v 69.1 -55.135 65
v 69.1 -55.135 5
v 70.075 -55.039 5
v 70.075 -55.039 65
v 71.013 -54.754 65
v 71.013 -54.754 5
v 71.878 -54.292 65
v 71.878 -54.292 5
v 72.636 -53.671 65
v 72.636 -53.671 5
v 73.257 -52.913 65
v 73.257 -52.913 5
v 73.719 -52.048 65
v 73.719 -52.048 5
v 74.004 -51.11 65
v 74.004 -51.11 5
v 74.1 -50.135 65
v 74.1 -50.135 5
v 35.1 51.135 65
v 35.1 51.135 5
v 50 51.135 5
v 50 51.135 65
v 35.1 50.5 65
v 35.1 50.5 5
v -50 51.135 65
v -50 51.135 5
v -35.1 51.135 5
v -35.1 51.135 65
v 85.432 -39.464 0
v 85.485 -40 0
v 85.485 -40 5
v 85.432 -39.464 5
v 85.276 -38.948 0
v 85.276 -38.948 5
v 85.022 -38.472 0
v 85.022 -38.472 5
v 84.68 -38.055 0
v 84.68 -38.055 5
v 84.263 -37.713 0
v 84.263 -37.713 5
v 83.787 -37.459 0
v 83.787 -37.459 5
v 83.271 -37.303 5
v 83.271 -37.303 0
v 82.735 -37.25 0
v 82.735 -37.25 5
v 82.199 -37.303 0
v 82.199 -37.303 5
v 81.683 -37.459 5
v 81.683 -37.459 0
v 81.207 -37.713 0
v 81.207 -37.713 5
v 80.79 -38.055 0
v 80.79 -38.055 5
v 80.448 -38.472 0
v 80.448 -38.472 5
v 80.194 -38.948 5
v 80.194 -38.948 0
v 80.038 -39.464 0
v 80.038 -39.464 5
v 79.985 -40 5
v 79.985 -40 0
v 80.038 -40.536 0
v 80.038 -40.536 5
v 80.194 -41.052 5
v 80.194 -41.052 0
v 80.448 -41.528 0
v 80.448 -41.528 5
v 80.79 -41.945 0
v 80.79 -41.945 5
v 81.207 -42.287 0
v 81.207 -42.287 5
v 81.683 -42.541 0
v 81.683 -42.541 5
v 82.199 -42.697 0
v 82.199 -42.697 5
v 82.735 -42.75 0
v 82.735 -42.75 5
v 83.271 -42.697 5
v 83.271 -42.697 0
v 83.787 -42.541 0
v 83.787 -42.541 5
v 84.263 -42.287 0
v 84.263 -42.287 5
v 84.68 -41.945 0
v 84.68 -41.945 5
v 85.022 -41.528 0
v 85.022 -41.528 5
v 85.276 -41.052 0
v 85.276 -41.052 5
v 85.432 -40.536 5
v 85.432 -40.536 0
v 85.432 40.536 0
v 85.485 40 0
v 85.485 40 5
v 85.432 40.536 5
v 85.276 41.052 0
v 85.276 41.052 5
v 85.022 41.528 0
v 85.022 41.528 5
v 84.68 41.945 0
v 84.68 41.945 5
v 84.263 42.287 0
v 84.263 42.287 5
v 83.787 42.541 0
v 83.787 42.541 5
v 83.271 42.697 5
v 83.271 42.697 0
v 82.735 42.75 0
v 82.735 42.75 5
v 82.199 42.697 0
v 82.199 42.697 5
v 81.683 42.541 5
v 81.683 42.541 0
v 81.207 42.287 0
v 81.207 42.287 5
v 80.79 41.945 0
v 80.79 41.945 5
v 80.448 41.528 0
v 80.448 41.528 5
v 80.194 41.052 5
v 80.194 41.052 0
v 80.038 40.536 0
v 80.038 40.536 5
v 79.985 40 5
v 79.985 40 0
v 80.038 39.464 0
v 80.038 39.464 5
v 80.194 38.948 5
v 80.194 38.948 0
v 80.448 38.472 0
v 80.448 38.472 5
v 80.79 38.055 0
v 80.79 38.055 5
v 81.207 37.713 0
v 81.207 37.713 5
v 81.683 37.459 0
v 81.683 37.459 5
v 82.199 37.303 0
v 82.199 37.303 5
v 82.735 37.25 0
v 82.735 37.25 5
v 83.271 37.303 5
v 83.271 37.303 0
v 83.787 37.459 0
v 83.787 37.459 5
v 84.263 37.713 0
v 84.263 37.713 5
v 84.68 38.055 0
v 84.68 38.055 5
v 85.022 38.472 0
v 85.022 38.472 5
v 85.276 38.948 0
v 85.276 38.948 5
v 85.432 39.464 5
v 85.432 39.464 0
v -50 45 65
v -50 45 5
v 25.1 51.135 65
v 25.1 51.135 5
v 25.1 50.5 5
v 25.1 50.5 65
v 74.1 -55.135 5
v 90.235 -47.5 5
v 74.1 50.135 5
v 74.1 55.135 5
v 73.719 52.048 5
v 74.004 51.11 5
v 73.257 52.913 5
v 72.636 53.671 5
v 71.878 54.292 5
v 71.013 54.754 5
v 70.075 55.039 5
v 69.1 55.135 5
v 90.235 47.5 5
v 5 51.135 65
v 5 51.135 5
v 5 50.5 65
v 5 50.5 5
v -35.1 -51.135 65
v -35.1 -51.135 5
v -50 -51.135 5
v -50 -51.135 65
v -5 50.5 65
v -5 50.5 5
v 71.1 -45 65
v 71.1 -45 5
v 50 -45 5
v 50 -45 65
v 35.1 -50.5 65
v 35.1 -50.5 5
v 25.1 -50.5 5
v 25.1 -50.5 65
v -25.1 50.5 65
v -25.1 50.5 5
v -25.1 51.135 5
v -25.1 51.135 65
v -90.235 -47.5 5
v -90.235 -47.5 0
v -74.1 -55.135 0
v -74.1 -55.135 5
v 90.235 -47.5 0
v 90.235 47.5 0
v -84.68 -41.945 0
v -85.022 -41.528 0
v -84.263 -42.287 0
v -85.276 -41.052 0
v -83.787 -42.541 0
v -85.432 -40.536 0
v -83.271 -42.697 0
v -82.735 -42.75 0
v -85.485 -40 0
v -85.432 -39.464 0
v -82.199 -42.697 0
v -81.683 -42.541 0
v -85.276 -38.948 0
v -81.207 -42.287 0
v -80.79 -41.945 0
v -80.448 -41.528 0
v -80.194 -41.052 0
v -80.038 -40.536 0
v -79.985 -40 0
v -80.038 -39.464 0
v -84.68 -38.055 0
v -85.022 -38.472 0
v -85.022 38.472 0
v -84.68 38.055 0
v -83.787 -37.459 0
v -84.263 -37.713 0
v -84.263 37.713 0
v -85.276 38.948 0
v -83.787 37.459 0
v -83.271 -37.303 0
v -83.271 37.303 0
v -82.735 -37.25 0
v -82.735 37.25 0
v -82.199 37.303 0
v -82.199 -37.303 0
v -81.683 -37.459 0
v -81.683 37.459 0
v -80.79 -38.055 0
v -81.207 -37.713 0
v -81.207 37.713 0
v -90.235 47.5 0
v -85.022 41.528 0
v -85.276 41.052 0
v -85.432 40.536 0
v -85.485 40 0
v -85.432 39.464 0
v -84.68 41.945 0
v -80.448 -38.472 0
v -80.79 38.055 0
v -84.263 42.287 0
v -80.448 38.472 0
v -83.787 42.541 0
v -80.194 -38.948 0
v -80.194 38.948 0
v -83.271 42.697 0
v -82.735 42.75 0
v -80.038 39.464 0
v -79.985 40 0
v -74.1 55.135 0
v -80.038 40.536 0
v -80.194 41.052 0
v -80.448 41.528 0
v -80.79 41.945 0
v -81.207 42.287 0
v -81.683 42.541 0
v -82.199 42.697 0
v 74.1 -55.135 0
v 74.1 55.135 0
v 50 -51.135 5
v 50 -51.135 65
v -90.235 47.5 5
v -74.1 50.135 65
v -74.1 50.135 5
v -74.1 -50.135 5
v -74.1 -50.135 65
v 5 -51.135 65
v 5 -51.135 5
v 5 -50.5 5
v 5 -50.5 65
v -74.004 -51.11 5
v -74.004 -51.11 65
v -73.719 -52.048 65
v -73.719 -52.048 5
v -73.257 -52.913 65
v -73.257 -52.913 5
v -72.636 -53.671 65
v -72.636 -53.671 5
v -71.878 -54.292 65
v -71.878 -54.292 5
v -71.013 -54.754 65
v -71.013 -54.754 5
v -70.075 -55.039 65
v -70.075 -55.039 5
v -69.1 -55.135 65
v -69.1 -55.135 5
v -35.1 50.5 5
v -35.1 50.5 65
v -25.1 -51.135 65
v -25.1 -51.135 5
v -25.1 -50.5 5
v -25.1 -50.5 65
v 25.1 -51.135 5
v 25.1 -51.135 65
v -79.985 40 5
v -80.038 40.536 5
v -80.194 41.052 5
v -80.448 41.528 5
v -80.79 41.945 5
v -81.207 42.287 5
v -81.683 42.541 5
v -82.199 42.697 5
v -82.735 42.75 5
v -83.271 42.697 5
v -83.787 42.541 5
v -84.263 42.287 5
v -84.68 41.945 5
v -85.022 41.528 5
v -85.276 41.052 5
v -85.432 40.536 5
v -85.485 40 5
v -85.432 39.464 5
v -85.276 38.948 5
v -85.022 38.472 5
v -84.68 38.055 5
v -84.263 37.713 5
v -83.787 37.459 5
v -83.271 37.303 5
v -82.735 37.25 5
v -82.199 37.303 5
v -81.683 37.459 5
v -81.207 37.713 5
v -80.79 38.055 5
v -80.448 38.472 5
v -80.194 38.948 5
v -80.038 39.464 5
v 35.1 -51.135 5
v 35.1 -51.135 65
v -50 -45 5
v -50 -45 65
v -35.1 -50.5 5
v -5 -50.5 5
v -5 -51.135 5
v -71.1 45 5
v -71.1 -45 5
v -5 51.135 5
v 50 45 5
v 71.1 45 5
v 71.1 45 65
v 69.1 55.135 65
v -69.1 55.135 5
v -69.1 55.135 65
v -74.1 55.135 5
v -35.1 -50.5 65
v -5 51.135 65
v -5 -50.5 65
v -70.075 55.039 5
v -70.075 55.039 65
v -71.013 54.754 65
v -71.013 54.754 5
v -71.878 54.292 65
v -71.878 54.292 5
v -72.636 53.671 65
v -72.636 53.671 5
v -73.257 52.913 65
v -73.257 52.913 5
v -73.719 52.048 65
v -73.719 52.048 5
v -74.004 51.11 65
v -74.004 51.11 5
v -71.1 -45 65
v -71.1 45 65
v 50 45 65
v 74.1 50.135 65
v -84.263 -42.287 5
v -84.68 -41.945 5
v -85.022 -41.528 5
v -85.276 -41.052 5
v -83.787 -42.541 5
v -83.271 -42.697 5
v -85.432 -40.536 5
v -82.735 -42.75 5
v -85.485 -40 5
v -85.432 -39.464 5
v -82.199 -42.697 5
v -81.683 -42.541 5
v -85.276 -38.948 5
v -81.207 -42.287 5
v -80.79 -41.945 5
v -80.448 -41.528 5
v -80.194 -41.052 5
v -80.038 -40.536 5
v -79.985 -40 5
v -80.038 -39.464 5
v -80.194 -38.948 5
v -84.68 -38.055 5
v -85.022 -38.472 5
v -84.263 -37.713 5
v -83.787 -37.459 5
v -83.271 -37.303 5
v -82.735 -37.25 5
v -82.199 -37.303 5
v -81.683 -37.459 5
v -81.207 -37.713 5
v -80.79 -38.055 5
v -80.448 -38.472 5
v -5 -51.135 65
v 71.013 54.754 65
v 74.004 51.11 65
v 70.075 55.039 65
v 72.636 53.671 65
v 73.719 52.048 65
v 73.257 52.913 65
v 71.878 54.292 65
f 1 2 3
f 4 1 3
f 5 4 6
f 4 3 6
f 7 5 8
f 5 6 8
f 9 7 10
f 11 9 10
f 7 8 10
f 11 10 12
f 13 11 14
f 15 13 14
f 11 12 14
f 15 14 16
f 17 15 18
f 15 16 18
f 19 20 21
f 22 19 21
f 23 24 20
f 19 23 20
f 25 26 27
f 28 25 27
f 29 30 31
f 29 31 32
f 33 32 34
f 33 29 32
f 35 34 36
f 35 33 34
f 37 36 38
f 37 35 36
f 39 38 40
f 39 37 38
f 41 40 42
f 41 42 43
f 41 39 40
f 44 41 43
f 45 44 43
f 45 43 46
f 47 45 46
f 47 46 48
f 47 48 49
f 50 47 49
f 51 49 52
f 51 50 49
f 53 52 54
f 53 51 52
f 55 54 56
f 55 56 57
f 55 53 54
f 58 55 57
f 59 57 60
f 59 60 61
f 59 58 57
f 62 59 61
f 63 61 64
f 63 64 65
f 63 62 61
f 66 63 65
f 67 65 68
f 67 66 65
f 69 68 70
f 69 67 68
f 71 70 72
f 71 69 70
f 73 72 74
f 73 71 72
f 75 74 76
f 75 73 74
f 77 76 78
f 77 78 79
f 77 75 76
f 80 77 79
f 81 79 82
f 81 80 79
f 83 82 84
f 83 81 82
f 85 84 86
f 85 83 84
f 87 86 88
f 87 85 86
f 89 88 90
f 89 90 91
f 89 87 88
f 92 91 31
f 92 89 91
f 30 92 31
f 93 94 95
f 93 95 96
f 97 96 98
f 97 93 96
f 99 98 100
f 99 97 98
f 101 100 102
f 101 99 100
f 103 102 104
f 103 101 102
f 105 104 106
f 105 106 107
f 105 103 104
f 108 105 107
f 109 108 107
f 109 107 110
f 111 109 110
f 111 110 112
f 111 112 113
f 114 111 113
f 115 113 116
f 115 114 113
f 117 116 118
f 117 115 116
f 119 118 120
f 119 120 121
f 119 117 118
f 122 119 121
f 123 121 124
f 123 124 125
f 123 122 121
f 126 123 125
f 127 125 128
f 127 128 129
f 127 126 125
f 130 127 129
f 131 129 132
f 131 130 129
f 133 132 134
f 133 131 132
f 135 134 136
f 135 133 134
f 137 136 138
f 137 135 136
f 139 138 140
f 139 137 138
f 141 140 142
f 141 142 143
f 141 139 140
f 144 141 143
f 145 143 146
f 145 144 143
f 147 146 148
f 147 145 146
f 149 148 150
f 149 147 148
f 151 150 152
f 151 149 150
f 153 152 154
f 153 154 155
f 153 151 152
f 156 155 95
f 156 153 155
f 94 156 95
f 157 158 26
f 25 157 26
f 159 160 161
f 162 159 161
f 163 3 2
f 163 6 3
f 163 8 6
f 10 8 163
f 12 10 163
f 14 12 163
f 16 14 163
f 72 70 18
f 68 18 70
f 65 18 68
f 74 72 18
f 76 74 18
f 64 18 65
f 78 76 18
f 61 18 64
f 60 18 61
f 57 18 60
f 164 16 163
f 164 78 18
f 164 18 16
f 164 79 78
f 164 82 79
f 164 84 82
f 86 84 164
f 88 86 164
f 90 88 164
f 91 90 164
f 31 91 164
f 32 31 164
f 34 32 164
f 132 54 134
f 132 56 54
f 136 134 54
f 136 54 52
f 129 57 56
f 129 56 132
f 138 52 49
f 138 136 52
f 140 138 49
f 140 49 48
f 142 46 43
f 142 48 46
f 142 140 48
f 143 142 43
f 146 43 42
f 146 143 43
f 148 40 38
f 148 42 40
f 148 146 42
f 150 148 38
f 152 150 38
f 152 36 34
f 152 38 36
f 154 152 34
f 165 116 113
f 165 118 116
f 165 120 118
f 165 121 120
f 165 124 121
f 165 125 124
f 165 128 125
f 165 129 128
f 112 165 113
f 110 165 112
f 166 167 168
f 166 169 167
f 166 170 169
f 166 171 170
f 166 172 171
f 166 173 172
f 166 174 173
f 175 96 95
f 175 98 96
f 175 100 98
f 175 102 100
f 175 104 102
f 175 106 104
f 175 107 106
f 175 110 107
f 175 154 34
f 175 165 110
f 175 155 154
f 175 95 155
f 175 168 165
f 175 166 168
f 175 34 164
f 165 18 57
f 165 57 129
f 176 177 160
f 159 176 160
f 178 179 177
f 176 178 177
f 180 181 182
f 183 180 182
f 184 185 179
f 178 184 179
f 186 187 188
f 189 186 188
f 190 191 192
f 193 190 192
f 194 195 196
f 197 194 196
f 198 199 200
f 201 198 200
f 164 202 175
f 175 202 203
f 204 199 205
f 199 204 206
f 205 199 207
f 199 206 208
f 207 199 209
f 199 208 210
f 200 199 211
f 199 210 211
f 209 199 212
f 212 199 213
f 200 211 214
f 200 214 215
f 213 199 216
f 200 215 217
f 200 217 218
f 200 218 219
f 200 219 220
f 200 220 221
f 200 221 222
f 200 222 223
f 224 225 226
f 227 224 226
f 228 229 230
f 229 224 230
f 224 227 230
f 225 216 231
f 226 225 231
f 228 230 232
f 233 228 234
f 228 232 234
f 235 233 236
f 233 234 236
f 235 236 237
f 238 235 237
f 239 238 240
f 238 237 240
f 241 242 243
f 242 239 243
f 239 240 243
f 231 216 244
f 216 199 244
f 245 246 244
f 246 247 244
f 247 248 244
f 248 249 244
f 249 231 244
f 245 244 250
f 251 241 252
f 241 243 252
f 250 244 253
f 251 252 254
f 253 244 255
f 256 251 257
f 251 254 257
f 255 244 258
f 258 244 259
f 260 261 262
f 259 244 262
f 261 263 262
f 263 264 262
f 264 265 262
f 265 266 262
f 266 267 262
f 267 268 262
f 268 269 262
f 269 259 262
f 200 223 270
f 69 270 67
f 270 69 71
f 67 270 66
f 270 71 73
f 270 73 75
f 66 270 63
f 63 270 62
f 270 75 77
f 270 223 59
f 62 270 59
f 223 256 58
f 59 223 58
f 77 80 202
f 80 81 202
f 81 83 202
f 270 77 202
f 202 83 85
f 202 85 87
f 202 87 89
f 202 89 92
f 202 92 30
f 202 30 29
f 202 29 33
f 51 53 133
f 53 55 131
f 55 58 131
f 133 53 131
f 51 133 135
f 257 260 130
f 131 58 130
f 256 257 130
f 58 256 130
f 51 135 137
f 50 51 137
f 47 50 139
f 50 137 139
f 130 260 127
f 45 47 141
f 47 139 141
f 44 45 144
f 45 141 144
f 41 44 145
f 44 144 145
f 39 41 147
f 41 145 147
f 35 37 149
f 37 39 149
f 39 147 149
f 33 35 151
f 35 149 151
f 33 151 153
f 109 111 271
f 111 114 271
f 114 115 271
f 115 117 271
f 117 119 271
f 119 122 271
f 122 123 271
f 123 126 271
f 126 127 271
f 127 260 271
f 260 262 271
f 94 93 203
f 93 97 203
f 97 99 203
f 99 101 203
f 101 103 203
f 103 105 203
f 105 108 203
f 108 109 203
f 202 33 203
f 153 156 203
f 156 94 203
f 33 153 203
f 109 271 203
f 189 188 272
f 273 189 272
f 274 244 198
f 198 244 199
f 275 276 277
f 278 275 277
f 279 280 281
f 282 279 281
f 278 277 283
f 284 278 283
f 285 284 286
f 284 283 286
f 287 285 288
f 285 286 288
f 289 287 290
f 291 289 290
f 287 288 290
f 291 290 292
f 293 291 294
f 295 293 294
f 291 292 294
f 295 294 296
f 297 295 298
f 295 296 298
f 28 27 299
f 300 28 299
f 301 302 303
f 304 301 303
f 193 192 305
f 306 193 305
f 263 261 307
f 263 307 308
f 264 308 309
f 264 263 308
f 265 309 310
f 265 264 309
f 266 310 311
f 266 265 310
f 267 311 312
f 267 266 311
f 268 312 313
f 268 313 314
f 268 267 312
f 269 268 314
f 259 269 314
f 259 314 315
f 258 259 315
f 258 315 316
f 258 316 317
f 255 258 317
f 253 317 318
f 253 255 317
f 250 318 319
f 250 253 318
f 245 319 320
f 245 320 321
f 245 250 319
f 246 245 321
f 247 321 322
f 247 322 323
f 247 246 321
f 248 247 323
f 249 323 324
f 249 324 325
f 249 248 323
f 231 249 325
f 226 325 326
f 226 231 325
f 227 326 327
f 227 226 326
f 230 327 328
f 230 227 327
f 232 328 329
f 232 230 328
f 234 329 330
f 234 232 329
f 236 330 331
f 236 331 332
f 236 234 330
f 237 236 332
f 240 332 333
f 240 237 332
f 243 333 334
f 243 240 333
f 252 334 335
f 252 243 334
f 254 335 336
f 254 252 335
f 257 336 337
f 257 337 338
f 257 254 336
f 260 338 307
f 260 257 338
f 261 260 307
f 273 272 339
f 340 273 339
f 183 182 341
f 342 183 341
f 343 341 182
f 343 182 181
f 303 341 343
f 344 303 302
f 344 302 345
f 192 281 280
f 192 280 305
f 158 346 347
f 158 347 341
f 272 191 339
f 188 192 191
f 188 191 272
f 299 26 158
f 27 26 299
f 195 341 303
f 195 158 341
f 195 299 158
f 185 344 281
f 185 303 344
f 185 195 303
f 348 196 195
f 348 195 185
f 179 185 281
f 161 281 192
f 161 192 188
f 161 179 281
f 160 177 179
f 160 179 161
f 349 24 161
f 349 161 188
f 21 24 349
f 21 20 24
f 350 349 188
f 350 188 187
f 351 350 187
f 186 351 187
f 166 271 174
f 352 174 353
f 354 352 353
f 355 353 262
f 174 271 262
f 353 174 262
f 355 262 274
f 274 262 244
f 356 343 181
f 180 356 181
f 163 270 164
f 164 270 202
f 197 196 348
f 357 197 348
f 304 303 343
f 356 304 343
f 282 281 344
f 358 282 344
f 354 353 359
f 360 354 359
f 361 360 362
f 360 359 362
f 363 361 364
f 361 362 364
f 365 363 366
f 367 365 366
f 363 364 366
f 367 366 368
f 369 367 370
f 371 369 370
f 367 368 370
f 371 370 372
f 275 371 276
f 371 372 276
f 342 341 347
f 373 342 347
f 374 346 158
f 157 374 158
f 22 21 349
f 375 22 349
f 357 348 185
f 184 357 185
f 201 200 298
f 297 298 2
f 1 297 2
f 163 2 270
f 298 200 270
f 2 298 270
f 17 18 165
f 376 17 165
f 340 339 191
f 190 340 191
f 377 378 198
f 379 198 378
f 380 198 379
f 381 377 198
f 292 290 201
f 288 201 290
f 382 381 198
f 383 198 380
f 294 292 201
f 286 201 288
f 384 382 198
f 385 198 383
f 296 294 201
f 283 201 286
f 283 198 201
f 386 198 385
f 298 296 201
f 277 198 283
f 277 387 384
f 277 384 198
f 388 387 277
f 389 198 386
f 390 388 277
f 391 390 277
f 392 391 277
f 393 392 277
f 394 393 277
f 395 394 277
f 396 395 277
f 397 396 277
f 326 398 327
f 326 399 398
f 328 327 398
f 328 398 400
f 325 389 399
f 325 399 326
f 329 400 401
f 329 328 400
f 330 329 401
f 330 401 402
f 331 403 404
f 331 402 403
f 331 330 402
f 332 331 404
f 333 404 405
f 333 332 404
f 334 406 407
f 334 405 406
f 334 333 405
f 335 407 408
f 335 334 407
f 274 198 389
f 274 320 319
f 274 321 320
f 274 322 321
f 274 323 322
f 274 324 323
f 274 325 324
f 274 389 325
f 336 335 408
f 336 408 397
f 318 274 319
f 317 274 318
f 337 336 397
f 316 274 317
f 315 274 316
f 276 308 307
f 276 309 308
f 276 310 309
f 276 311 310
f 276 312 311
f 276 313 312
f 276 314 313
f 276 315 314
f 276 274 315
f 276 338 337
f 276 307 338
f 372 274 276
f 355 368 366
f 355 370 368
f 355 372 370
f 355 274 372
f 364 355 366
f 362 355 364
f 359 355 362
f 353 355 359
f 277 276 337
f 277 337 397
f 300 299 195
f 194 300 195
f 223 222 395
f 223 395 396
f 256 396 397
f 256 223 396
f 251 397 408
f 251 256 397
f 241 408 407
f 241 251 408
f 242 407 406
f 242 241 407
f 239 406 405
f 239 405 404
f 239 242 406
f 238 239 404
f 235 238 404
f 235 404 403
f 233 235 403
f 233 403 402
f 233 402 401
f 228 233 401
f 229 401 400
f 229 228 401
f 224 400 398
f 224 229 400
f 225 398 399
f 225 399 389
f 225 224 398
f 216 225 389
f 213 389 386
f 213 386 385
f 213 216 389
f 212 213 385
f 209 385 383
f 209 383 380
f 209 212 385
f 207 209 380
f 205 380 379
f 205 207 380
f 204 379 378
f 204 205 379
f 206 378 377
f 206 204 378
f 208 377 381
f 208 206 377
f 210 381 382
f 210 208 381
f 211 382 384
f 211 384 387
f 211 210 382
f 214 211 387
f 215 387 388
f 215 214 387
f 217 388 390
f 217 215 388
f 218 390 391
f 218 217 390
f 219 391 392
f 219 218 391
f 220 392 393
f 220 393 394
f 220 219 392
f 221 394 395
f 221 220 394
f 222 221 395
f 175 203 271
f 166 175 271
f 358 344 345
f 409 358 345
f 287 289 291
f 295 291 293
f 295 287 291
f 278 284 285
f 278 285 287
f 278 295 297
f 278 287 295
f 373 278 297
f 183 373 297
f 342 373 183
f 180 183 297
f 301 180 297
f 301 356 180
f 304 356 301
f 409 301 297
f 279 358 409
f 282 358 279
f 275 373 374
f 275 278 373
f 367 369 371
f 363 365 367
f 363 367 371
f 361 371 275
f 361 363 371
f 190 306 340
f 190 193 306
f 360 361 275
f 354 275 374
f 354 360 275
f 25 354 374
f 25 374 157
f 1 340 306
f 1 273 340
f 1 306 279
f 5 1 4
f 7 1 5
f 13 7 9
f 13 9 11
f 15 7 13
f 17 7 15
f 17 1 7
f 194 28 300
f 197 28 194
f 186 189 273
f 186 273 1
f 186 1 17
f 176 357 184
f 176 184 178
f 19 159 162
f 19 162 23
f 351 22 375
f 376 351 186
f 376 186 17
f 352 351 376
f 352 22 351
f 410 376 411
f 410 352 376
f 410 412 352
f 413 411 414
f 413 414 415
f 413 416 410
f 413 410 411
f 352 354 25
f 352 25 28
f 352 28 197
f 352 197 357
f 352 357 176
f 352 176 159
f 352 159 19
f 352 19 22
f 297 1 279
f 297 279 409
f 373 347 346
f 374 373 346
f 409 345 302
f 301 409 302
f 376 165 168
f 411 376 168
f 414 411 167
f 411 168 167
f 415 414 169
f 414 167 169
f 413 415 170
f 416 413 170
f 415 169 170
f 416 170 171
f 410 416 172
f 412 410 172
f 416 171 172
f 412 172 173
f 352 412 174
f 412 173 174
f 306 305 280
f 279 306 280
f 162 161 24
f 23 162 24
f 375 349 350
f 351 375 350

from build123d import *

# Parameters (mm, degrees)
F0_R     = 2.75
F1_DEPTH = 5
F3_DEPTH = 60


with BuildPart() as f1:
    # F0 (on Top) → F1 (new body)
    with BuildSketch(Plane.XY):
        Polygon((74.1, 55.135), (-74.1, 55.135), (-90.235, 47.5), (-90.235, -47.5), (-74.1, -55.135), (74.1, -55.135), (90.235, -47.5), (90.235, 47.5), align=None)
        with Locations((-82.735, -40)):
            Circle(F0_R, mode=Mode.SUBTRACT)
        with Locations((82.735, -40)):
            Circle(F0_R, mode=Mode.SUBTRACT)
        with Locations((-82.735, 40)):
            Circle(F0_R, mode=Mode.SUBTRACT)
        with Locations((82.735, 40)):
            Circle(F0_R, mode=Mode.SUBTRACT)
    extrude(amount=F1_DEPTH)

    # F2 (on face) → F3 (join)
    with BuildSketch(Plane.XY.offset(5)):
        with BuildLine():
            ThreePointArc((74.1, 50.135), (72.635534, 53.670534), (69.1, 55.135))
            Line((69.1, 55.135), (-69.1, 55.135))
            ThreePointArc((-69.1, 55.135), (-72.635534, 53.670534), (-74.1, 50.135))
            Line((-74.1, 50.135), (-74.1, -50.135))
            ThreePointArc((-74.1, -50.135), (-72.635534, -53.670534), (-69.1, -55.135))
            Line((-69.1, -55.135), (69.1, -55.135))
            ThreePointArc((69.1, -55.135), (72.635534, -53.670534), (74.1, -50.135))
            Line((74.1, -50.135), (74.1, 50.135))
        make_face()
        Polygon((-5, 50.5), (0, 50.5), (5, 50.5), (5, 51.135), (25.1, 51.135), (25.1, 50.5), (35.1, 50.5), (35.1, 51.135), (50, 51.135), (50, 45), (71.1, 45), (71.1, -45), (50, -45), (50, -51.135), (35.1, -51.135), (35.1, -50.5), (25.1, -50.5), (25.1, -51.135), (5, -51.135), (5, -50.5), (0, -50.5), (-5, -50.5), (-5, -51.135), (-25.1, -51.135), (-25.1, -50.5), (-35.1, -50.5), (-35.1, -51.135), (-50, -51.135), (-50, -45), (-71.1, -45), (-71.1, 45), (-50, 45), (-50, 51.135), (-35.1, 51.135), (-35.1, 50.5), (-25.1, 50.5), (-25.1, 51.135), (-5, 51.135), align=None, mode=Mode.SUBTRACT)
    extrude(amount=F3_DEPTH)


solid = f1.part
